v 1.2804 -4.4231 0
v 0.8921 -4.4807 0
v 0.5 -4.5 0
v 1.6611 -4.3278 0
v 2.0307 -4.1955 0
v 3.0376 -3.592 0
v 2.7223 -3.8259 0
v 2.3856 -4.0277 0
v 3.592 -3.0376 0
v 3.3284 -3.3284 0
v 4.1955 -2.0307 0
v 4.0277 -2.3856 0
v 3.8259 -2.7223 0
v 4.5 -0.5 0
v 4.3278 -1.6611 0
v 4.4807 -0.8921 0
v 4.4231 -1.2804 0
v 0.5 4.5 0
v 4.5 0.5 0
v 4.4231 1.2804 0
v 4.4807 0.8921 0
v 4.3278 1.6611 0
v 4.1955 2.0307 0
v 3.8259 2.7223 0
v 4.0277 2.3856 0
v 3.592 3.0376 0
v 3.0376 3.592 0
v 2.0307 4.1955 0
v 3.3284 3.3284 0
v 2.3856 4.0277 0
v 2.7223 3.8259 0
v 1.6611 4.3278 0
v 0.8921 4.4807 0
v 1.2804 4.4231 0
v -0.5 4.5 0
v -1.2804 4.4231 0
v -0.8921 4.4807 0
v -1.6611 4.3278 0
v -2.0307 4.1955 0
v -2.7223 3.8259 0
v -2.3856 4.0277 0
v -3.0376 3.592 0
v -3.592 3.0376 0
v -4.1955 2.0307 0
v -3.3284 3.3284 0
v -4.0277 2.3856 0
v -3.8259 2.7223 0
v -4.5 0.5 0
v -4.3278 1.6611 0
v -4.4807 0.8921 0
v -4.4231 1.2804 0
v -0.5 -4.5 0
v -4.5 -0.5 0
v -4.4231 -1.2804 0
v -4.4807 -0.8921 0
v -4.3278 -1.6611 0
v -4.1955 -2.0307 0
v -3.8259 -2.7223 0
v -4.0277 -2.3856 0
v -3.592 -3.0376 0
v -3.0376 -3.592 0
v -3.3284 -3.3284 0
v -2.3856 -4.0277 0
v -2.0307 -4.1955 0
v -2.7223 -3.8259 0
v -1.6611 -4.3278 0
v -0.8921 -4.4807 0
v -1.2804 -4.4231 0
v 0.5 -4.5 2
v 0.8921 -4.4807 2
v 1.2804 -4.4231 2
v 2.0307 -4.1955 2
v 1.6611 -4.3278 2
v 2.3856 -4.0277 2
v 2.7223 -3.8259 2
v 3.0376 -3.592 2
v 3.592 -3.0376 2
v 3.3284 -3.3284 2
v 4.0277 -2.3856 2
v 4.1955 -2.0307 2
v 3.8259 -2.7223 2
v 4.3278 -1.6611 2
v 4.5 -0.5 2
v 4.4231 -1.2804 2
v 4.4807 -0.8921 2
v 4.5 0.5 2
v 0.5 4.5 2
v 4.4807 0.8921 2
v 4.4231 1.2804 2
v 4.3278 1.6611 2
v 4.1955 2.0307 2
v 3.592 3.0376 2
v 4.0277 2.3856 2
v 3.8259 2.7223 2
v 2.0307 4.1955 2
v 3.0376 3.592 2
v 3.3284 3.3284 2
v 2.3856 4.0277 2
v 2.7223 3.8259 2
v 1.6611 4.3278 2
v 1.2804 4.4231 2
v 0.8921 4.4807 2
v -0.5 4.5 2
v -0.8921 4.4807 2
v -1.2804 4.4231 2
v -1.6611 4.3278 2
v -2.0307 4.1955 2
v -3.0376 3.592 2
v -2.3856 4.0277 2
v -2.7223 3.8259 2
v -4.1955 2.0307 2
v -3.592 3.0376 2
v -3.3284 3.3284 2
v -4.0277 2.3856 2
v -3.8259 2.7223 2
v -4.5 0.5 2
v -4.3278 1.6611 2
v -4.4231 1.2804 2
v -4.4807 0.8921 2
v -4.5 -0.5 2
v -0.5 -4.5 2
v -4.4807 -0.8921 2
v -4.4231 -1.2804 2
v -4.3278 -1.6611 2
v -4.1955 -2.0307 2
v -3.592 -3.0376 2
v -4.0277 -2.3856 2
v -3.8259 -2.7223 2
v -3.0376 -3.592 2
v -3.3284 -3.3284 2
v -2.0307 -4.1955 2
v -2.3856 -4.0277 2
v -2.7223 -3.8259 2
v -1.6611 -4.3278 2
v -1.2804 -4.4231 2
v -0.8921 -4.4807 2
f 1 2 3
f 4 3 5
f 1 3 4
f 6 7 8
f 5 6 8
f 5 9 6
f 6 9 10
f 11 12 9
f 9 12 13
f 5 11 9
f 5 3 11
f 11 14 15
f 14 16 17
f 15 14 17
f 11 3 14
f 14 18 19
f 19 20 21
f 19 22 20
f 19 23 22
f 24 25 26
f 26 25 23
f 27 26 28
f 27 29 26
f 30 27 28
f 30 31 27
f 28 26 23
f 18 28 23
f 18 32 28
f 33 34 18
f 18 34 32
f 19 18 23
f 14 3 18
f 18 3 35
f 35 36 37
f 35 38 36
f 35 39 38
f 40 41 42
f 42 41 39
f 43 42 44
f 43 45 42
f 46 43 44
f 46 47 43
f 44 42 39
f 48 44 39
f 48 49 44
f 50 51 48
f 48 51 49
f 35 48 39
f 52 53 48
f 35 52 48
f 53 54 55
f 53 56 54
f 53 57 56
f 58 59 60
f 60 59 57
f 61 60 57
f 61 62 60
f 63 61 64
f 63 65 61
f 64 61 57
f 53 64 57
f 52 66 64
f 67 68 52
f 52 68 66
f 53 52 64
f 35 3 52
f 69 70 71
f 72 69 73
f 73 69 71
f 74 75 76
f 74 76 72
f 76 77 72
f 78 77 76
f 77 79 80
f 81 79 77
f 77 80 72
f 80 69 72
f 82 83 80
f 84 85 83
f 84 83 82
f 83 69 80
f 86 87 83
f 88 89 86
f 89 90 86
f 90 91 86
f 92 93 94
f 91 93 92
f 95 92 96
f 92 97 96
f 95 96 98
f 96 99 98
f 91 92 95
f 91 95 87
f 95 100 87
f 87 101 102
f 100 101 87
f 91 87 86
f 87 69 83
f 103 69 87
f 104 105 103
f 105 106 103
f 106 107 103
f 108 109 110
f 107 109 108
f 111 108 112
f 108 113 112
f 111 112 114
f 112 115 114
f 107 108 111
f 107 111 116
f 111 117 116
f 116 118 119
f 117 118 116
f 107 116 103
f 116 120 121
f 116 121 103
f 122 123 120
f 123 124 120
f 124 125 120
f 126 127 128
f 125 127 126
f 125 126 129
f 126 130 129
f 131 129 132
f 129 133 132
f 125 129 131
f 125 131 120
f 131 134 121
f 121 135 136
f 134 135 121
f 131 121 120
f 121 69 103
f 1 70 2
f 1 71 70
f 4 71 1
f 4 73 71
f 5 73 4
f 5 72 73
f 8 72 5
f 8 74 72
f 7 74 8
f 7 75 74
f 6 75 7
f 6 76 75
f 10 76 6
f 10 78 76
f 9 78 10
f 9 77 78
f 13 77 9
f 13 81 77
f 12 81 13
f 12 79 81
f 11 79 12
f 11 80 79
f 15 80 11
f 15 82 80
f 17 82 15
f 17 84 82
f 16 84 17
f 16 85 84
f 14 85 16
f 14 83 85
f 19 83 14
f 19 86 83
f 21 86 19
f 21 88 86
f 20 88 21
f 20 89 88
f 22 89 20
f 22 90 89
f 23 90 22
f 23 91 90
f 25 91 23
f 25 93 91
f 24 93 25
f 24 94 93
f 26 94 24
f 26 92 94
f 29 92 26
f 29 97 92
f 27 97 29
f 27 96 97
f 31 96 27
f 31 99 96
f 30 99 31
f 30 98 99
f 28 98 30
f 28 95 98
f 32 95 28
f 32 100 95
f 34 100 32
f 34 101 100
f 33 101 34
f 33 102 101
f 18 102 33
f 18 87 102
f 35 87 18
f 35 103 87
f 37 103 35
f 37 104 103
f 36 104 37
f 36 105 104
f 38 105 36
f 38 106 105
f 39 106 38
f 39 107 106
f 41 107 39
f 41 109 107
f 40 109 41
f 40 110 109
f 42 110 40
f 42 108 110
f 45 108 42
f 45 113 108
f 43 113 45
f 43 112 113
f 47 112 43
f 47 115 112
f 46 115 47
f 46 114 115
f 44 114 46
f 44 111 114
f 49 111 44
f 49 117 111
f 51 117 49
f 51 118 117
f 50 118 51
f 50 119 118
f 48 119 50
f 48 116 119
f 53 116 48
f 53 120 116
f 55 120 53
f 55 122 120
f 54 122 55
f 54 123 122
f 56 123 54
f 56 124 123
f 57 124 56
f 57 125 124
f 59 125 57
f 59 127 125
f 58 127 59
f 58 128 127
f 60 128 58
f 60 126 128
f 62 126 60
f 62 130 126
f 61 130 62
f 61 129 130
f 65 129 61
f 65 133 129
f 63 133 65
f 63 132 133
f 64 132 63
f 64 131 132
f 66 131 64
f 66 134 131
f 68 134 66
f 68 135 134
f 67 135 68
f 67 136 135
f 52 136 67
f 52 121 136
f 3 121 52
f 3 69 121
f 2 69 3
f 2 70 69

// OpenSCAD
// file: lib/logo_plaque.scad
// Raised multi-color logo on a rounded base.
//
//   side view
//
//        ▄▄▄  ▒▒▒▒   ░░    ← logo layers, one per filament
//   ▐████████████████████▌ ← base
//
// Every layer SVG shares one pixel frame, so the layers line up without
// centering each one (centering would use each layer's own outline).

$fn = 64;

BASE_HEIGHT = 2;
LOGO_HEIGHT = 1.2;
BORDER = 3;
CORNER_RADIUS = 4;
AVATAR_FN = 180;
MARK_HEIGHT = 4;
TIE_HEIGHT = 1.2;

// potrace writes one point per pixel, and OpenSCAD reads points as 1/72 inch
MM_PER_FRAME_PX = 25.4 / 72;

module layer_2d(dir, name, frame, width) {
    scale(width / (frame.x * MM_PER_FRAME_PX))
        translate([-frame.x / 2, -frame.y / 2] * MM_PER_FRAME_PX)
            import(str(dir, "/", name, ".svg"));
}

// Earlier layers win where traced outlines overlap, so no two parts share volume.
module clipped_layer_2d(dir, layers, index, frame, width) {
    difference() {
        layer_2d(dir, layers[index][0], frame, width);

        for (earlier = [0:1:index - 1]) {
            layer_2d(dir, layers[earlier][0], frame, width);
        }
    }
}

module rounded_base_2d(frame, width, border, corner_radius) {
    height = width * frame.y / frame.x;

    offset(r = corner_radius)
        square(
            [
                width + (border - corner_radius) * 2,
                height + (border - corner_radius) * 2,
            ],
            center = true
        );
}

// `part` selects one filament for export: "base", a layer name, or "all".
// With `diameter`, the base is a circle instead of a rounded rectangle.
module logo_plaque(
    dir,
    frame,
    width,
    base_color,
    layers,
    part = "all",
    base_height = BASE_HEIGHT,
    logo_height = LOGO_HEIGHT,
    border = BORDER,
    corner_radius = CORNER_RADIUS,
    diameter = undef
) {
    if (part == "all" || part == "base") {
        color(base_color)
            linear_extrude(height = base_height)
                if (is_undef(diameter)) {
                    rounded_base_2d(frame, width, border, corner_radius);
                } else {
                    circle(d = diameter, $fn = AVATAR_FN);
                }
    }

    for (index = [0:1:len(layers) - 1]) {
        if (part == "all" || part == layers[index][0]) {
            color(layers[index][1])
                translate([0, 0, base_height])
                    linear_extrude(height = logo_height)
                        clipped_layer_2d(dir, layers, index, frame, width);
        }
    }
}

// The logo extruded with no base.
//
//   side view
//
//   ████  ████   ▒▒▒▒ ← layers at full height
//   ████▁▁████▁▁▁▒▒▒▒ ← low ties join loose pieces
//
// Each layer is [name, color, has_ties]. Ties are in "<name>_ties.svg", and stop
// at other layers so that no two parts share volume.
//
// With `back_color`, one more filament joins the pieces. The ties, in "ties.svg",
// and the logo's outline form a back layer, and the logo sits on top of it:
//
//   ████  ████   ▒▒▒▒
//   ▄▄▄▄▄▄▄▄▄▄▄▄▄▄▄▄▄ ← back layer, `tie_height` thick
//
// `part` selects one filament for export: "back", a layer name, or "all".
module logo_mark(
    dir,
    frame,
    width,
    layers,
    part = "all",
    height = MARK_HEIGHT,
    tie_height = TIE_HEIGHT,
    back_color = undef,
    back_has_ties = false
) {
    has_back = !is_undef(back_color);
    logo_z = has_back ? tie_height : 0;

    if (has_back && (part == "all" || part == "back")) {
        color(back_color)
            linear_extrude(height = tie_height) {
                for (layer = layers) {
                    layer_2d(dir, layer[0], frame, width);
                }

                if (back_has_ties) {
                    layer_2d(dir, "ties", frame, width);
                }
            }
    }

    for (index = [0:1:len(layers) - 1]) {
        name = layers[index][0];

        if (part == "all" || part == name) {
            color(layers[index][1]) {
                translate([0, 0, logo_z])
                    linear_extrude(height = height - logo_z)
                        clipped_layer_2d(dir, layers, index, frame, width);

                if (layers[index][2]) {
                    linear_extrude(height = tie_height)
                        difference() {
                            layer_2d(dir, str(name, "_ties"), frame, width);

                            for (other = layers) {
                                if (other[0] != name) {
                                    layer_2d(dir, other[0], frame, width);
                                }
                            }
                        }
                }
            }
        }
    }
}
// main file
use <lib/logo_plaque.scad>

logo_plaque("logos/lula.svg", base_style = "rect");
